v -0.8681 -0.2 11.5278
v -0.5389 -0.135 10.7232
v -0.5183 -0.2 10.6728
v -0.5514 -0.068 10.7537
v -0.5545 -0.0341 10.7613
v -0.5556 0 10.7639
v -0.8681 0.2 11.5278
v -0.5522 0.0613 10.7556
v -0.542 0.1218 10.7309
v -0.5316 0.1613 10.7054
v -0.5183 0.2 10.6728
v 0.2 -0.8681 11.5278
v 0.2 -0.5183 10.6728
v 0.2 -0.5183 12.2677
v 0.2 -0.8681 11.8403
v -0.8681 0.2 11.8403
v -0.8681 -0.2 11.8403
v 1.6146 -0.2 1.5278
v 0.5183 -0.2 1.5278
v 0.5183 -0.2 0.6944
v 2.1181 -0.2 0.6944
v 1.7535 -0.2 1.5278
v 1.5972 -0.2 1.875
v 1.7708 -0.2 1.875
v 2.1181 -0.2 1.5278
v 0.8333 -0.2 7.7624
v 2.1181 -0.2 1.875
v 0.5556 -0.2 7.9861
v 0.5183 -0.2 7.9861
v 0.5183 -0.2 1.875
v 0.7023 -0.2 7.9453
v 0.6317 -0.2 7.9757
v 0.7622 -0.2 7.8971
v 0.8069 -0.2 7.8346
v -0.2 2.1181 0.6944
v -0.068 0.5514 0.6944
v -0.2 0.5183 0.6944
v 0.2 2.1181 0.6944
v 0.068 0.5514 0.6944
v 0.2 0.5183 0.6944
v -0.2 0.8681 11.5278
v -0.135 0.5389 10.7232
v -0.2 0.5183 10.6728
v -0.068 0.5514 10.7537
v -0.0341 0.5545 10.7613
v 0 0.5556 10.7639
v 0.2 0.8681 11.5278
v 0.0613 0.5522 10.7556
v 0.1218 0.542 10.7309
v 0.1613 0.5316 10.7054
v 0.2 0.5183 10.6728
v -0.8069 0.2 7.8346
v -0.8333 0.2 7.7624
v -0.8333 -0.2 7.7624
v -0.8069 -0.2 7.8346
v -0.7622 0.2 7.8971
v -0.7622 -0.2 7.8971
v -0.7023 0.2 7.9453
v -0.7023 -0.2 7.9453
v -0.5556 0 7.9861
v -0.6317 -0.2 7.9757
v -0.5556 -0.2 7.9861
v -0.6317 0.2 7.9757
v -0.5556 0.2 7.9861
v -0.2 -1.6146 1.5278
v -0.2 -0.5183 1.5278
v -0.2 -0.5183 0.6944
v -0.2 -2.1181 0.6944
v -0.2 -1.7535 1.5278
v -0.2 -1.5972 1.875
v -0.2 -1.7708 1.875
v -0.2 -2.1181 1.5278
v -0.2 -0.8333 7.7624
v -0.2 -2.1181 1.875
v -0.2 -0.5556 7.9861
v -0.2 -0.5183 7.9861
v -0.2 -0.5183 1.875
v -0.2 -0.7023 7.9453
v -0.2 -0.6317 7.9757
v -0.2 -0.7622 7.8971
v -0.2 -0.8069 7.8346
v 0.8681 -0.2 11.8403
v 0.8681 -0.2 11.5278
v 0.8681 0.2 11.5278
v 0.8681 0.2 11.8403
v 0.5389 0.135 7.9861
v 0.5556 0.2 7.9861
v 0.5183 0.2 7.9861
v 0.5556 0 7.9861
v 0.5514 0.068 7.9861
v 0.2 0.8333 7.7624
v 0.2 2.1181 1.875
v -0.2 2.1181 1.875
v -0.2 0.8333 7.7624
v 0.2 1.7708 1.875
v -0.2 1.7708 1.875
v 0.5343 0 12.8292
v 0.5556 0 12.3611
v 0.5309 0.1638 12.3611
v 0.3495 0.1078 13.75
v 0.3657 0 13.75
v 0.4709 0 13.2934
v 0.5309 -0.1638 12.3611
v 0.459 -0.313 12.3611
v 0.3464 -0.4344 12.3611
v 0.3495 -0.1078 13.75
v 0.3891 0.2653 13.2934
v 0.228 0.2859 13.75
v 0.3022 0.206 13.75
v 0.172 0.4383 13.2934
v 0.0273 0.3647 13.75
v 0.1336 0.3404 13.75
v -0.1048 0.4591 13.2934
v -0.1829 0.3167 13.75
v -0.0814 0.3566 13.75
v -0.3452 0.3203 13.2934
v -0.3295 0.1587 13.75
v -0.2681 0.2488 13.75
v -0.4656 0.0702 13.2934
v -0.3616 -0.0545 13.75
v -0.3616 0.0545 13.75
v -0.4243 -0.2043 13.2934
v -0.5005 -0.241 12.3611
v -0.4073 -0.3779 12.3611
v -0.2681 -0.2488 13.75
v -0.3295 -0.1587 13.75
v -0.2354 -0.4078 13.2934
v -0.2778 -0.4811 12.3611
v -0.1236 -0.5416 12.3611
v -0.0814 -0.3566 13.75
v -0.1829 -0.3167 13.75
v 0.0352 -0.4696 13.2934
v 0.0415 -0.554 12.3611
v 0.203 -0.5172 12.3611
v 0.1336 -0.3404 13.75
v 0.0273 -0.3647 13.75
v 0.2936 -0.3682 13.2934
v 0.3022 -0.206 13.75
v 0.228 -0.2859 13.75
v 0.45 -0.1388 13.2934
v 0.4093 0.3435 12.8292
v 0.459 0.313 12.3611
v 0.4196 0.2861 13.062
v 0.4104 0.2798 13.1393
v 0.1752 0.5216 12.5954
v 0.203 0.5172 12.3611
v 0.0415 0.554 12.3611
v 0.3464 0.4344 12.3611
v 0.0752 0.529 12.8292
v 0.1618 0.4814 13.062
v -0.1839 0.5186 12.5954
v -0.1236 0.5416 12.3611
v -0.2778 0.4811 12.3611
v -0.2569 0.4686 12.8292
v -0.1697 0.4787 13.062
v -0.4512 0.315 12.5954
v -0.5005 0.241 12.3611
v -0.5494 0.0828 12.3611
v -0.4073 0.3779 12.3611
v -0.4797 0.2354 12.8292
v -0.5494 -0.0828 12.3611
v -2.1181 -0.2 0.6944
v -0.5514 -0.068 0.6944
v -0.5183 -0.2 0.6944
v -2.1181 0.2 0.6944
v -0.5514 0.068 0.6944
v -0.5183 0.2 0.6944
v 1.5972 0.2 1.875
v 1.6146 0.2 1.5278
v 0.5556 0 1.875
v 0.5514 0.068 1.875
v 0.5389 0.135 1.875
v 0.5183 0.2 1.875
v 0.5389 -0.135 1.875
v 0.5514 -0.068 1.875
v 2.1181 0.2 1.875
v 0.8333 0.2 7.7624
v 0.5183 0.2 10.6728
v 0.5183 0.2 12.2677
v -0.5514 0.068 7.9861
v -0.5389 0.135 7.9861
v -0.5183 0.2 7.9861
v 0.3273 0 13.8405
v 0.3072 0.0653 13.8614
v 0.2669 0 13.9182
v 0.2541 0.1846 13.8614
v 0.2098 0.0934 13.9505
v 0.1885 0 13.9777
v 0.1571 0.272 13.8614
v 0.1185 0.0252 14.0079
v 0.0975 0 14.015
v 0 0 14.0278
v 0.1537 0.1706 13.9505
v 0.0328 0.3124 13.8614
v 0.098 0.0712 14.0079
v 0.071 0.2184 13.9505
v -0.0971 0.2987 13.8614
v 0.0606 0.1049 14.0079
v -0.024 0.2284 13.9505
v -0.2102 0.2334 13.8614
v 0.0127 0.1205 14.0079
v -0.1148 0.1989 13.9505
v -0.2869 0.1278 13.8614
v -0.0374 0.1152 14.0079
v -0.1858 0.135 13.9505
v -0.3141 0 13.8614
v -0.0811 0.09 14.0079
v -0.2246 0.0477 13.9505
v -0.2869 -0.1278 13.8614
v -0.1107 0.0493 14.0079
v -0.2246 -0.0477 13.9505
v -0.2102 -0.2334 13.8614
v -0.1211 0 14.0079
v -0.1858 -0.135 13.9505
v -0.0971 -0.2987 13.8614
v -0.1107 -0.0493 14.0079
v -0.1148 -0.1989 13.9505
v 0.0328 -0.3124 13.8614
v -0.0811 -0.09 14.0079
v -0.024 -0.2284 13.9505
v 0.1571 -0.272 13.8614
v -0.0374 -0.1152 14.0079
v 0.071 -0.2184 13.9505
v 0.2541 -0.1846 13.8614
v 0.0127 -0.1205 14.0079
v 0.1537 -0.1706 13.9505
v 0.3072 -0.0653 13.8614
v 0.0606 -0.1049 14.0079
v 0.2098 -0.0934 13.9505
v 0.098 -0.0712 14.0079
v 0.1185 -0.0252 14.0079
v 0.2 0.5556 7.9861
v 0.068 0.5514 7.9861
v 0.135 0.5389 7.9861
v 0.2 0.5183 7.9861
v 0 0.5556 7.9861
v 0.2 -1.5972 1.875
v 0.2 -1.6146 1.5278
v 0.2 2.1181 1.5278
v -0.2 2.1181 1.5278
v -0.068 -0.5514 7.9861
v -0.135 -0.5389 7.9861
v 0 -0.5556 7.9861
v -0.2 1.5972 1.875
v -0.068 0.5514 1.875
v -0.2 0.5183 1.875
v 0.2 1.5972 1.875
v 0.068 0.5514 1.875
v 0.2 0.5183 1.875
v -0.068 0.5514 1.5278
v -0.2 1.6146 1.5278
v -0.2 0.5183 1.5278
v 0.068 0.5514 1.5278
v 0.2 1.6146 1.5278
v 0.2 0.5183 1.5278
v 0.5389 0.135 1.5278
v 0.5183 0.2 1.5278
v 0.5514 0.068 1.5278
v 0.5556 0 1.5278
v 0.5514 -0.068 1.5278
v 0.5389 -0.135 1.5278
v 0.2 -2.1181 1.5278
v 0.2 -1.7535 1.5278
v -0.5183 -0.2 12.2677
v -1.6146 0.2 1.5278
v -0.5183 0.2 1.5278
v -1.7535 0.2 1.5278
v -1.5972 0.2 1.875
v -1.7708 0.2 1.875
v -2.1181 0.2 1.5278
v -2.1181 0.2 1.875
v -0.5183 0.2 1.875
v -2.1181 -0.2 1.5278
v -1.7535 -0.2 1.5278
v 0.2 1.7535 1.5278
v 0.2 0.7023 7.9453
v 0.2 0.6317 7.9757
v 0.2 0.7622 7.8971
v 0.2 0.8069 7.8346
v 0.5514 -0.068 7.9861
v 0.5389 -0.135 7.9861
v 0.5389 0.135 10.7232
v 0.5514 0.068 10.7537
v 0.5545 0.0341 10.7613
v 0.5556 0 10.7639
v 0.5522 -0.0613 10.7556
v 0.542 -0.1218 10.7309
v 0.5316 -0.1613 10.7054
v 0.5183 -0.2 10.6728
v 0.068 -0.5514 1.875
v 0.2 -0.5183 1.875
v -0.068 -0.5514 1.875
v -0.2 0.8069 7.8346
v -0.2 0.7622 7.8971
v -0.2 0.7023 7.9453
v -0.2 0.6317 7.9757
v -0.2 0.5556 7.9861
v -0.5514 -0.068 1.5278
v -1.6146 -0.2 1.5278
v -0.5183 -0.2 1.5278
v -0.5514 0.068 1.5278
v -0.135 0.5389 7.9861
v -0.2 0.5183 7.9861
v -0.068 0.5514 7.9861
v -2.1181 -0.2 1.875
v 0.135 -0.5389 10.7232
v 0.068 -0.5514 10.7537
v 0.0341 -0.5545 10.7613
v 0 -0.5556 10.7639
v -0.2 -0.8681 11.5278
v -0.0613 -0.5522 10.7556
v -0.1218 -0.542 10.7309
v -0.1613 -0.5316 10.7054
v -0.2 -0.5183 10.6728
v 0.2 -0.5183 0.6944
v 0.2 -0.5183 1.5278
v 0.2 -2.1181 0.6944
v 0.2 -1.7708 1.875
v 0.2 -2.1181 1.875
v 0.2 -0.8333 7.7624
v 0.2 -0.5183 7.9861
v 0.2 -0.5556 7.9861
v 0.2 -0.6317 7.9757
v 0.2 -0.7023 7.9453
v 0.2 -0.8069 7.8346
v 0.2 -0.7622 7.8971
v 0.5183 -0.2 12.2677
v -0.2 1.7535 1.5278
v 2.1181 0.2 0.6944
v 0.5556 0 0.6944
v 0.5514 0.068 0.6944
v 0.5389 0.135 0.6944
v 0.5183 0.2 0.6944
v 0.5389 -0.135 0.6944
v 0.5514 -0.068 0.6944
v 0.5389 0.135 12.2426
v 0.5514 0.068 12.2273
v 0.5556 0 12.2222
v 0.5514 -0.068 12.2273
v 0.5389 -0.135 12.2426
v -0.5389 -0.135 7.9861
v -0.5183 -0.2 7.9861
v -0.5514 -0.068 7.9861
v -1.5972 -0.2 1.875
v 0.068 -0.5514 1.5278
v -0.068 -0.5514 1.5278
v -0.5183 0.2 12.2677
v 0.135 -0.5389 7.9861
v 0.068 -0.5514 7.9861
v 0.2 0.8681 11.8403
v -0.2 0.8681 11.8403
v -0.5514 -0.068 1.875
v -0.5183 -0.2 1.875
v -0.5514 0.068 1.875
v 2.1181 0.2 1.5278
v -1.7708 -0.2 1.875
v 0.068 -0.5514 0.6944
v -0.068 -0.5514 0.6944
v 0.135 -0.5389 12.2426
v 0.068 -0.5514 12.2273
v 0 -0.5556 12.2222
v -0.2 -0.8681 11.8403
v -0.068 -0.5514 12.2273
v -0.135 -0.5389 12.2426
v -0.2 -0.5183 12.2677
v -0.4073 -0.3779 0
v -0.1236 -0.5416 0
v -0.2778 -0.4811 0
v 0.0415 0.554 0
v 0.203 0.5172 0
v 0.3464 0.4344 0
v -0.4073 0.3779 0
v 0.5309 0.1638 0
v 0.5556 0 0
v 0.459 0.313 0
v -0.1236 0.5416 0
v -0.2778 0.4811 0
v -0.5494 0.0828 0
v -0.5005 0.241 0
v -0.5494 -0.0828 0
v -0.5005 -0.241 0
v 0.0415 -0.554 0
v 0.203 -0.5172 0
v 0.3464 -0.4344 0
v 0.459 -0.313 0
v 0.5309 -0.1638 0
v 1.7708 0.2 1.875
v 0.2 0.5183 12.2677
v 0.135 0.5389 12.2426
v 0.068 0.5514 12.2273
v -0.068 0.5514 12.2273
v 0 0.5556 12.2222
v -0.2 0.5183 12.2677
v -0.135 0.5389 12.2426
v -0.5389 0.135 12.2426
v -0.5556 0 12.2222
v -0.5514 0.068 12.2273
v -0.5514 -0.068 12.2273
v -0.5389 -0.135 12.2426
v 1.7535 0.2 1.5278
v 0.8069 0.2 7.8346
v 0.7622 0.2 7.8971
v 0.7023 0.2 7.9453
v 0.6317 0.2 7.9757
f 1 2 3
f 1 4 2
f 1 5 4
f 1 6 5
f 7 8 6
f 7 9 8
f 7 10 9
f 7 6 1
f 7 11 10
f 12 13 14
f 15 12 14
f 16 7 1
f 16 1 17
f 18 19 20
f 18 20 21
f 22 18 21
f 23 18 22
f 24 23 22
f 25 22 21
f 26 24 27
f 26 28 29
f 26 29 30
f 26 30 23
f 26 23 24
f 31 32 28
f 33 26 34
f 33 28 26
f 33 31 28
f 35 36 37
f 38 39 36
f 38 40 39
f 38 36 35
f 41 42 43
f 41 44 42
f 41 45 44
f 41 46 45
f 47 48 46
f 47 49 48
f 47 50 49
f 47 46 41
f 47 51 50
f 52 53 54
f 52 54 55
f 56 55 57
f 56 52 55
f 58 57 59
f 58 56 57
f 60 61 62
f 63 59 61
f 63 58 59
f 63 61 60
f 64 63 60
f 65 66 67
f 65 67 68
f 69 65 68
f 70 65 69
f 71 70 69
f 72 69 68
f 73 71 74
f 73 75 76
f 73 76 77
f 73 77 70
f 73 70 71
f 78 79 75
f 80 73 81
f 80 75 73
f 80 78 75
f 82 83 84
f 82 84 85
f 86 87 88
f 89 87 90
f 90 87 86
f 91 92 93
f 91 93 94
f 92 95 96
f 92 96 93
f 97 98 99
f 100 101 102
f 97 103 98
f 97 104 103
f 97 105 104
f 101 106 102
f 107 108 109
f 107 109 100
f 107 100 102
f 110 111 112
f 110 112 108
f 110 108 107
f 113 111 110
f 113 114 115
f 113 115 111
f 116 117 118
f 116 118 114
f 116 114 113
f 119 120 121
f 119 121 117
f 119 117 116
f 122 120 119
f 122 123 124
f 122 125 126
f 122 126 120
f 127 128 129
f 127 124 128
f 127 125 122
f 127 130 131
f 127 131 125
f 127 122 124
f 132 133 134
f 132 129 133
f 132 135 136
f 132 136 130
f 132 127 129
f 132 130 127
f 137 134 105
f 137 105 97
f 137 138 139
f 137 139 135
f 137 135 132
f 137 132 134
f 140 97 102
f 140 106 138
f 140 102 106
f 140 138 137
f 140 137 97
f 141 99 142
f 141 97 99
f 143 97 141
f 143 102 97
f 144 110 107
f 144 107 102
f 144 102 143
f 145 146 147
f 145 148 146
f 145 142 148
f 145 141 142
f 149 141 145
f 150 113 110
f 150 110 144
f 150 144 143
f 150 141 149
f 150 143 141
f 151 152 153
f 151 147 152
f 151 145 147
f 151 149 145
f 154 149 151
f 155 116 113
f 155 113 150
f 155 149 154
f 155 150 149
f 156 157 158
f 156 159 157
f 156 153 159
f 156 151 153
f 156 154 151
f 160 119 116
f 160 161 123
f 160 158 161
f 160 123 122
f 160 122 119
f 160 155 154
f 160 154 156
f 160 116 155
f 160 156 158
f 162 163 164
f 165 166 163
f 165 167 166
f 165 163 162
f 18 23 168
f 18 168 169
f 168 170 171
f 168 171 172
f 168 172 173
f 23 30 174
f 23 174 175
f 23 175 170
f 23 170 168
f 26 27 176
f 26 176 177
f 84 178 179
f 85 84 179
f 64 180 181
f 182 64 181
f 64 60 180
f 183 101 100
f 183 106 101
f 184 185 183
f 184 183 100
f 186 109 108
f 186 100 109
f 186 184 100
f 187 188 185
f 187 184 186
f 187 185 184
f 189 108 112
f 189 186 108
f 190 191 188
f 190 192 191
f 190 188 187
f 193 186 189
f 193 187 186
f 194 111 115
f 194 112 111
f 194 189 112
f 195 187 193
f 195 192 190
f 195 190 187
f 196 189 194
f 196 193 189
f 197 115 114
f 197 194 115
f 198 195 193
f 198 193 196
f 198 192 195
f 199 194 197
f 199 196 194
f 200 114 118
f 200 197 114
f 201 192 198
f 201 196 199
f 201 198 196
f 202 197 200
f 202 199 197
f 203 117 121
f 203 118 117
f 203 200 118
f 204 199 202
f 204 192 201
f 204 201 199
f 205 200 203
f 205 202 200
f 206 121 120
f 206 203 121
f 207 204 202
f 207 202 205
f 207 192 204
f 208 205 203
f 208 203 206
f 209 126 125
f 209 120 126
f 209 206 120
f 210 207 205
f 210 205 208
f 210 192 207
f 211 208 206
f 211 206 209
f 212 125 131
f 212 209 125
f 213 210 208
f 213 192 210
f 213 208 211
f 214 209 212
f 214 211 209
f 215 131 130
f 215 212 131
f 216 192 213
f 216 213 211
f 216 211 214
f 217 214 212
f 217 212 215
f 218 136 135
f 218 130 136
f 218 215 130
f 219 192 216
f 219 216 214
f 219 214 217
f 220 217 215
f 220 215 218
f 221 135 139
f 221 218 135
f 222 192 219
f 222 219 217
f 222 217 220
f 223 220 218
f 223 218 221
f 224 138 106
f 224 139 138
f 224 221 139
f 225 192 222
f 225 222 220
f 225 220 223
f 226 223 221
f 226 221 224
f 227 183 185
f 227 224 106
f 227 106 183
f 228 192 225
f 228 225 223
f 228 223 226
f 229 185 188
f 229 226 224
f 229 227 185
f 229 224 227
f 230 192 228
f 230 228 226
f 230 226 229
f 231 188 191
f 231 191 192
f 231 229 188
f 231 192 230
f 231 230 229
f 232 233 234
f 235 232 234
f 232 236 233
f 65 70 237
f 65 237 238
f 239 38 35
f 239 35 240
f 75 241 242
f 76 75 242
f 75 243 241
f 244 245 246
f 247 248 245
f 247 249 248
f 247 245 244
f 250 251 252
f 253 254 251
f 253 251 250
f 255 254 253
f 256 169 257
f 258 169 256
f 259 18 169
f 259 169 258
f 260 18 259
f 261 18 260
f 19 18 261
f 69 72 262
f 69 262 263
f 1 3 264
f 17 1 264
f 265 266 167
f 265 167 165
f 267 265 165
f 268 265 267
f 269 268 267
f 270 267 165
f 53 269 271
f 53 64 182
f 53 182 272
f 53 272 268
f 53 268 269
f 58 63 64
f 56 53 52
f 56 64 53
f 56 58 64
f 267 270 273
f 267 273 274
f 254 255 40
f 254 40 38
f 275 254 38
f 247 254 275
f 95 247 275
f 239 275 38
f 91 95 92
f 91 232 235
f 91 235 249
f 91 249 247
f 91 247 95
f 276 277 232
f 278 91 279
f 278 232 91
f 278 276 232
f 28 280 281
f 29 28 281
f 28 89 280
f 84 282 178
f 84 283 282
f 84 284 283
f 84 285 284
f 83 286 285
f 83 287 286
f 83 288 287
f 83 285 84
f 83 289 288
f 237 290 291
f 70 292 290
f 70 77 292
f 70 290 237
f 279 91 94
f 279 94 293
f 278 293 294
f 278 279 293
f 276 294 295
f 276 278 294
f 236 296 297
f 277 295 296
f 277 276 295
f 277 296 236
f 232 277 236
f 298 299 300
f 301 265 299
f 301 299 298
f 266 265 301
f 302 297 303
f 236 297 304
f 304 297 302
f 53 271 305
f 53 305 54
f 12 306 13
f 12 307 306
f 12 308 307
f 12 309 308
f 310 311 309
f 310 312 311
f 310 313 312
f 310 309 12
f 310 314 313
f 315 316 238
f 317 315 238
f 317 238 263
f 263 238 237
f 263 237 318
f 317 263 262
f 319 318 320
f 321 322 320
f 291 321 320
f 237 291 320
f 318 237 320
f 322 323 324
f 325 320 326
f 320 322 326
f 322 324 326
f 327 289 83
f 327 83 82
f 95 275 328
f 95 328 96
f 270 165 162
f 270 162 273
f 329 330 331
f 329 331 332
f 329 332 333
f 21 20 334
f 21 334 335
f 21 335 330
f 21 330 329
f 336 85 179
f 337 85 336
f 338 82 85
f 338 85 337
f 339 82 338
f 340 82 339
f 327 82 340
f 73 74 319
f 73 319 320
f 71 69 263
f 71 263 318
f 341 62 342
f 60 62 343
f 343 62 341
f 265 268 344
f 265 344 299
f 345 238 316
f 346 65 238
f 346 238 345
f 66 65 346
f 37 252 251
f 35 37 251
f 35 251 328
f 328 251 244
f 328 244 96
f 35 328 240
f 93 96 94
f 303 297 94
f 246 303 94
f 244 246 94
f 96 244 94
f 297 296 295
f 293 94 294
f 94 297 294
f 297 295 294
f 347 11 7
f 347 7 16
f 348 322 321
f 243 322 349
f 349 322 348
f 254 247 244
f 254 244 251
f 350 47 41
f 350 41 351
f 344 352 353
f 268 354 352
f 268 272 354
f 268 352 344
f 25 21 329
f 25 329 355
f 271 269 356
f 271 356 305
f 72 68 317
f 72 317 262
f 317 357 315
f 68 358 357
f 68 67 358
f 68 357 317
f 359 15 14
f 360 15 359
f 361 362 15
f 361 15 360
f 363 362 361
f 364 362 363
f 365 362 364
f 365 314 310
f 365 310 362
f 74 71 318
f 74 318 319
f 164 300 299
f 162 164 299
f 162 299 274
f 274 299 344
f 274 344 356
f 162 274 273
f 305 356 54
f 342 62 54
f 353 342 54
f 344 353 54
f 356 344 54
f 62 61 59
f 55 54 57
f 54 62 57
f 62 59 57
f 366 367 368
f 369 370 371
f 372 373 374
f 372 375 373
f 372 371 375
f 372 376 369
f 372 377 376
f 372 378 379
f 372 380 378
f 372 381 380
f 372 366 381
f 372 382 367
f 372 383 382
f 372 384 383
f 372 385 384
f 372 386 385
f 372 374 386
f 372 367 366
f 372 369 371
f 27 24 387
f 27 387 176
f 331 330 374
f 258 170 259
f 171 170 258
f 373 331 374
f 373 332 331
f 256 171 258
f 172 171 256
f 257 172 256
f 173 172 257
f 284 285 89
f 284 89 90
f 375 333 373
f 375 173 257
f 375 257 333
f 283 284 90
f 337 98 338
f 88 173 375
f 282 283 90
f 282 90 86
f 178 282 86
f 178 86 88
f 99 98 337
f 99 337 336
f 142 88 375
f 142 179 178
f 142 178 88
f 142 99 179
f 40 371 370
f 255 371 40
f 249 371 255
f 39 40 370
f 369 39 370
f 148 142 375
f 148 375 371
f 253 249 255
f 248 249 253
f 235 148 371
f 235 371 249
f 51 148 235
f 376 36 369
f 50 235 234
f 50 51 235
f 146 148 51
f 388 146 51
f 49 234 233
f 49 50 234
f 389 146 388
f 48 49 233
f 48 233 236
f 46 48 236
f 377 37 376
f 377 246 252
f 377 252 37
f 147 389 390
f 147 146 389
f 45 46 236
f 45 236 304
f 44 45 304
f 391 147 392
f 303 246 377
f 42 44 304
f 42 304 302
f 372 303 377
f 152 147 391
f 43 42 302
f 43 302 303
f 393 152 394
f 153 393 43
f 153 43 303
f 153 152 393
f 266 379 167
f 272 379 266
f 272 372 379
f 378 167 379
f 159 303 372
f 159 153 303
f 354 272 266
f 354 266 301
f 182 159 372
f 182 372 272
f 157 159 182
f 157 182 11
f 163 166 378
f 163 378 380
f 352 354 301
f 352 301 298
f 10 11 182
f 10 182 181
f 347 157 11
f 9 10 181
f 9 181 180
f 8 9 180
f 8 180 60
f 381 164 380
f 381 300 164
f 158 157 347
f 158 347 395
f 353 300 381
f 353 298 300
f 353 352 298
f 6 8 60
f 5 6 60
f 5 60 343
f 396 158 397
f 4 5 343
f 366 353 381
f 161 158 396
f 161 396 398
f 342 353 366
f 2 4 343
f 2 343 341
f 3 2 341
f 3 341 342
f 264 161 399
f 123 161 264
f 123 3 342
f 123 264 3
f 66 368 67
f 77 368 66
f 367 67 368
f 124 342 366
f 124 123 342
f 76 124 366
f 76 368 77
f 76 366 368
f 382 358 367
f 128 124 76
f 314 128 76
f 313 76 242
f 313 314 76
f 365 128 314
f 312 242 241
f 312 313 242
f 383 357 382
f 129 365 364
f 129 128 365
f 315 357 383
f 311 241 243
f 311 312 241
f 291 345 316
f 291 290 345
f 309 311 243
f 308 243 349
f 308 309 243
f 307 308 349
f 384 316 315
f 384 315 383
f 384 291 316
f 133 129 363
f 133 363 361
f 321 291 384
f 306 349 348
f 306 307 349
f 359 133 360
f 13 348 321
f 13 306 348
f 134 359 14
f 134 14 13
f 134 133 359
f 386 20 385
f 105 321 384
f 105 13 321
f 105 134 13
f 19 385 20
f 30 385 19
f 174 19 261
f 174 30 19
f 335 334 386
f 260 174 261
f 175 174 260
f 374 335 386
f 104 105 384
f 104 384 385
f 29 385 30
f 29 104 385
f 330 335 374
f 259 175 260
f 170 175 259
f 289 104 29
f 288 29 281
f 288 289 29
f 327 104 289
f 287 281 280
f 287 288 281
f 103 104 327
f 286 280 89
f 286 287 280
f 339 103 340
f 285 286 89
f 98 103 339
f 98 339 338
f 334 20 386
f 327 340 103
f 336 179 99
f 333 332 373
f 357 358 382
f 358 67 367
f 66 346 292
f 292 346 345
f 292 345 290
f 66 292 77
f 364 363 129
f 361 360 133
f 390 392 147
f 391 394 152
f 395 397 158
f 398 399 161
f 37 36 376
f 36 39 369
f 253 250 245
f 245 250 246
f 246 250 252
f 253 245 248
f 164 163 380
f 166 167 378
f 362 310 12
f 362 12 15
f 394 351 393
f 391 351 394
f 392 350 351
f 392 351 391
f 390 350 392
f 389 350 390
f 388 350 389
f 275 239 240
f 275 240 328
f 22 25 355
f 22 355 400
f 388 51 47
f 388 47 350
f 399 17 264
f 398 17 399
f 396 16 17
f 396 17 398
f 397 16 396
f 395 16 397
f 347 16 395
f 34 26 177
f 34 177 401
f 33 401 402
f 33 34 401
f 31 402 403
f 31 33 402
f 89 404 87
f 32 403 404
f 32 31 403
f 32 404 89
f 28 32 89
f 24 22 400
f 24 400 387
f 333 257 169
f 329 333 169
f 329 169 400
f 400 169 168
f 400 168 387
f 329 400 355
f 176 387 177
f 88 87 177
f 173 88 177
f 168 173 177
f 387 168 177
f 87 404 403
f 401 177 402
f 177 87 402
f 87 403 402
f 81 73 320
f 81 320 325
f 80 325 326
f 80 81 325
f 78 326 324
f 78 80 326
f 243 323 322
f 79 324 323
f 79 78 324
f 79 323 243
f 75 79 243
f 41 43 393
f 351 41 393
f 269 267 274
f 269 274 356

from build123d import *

# Parameters (mm, degrees)
F3_DEPTH = 0.2
F4_COUNT = 4


# Not quite as in the source:
# - a feature names something its author has since deleted; it is built from what else it names


with BuildPart() as f1:
    # F0 (on Front) → F1 (revolve)
    with BuildSketch(Plane.XZ):
        with BuildLine():
            Line((0, 14.0277777778), (0, 0))
            Line((0, 0), (0.5555555556, 0))
            Line((0.5555555556, 0), (0.5555555556, 12.3611111111))
            ThreePointArc((0.5555555556, 12.3611111111), (0.5078793667, 13.0620116793), (0.3657291084, 13.75))
            ThreePointArc((0.3657291084, 13.75), (0.2296291982, 13.9504603784), (0, 14.0277777778))
        make_face()
    revolve(axis=Axis((0, 0, 7.0138888889), (0, 0, 1)))

    # F2 (on Front) → F3 (join, symmetric)
    with BuildSketch(Plane.XZ):
        with BuildLine():
            Line((0, 12.6567901235), (0, 0.6944444444))
            Line((0, 0.6944444444), (2.1180555556, 0.6944444444))
            Line((2.1180555556, 0.6944444444), (2.1180555556, 1.5277777778))
            Line((2.1180555556, 1.5277777778), (1.7534722222, 1.5277777778))
            Line((1.7534722222, 1.5277777778), (1.6145833333, 1.5277777778))
            Line((1.6145833333, 1.5277777778), (0.4, 1.5277777778))
            Line((0.4, 1.5277777778), (0.4, 1.875))
            Line((0.4, 1.875), (1.5972222222, 1.875))
            Line((1.5972222222, 1.875), (1.7708333333, 1.875))
            Line((1.7708333333, 1.875), (2.1180555556, 1.875))
            Line((2.1180555556, 1.875), (0.8333333333, 7.7624119633))
            ThreePointArc((0.8333333333, 7.7624119633), (0.7338823641, 7.9232334612), (0.5555555556, 7.9861111111))
            Line((0.5555555556, 7.9861111111), (0.2, 7.9861111111))
            Line((0.2, 7.9861111111), (0.2, 9.8947530864))
            Line((0.2, 9.8947530864), (0.8680555556, 11.5277777778))
            Line((0.8680555556, 11.5277777778), (0.8680555556, 11.8402777778))
            Line((0.8680555556, 11.8402777778), (0.2, 12.6567901235))
            Line((0.2, 12.6567901235), (0, 12.6567901235))
        make_face()
        Polygon((1.6145833333, 1.5277777778), (1.7534722222, 1.5277777778), (1.7708333333, 1.875), (1.5972222222, 1.875), align=None)
    extrude(amount=F3_DEPTH, both=True)

    # F4: F1 ×4 about axis
    f4_axis = Axis((0, 0, 0), (0, 0, 1))


with BuildPart() as f1_1:
    add(f1.part)
    for i in range(1, F4_COUNT):
        add(f1.part.rotate(f4_axis, i * 360 / F4_COUNT))


solid = f1_1.part
